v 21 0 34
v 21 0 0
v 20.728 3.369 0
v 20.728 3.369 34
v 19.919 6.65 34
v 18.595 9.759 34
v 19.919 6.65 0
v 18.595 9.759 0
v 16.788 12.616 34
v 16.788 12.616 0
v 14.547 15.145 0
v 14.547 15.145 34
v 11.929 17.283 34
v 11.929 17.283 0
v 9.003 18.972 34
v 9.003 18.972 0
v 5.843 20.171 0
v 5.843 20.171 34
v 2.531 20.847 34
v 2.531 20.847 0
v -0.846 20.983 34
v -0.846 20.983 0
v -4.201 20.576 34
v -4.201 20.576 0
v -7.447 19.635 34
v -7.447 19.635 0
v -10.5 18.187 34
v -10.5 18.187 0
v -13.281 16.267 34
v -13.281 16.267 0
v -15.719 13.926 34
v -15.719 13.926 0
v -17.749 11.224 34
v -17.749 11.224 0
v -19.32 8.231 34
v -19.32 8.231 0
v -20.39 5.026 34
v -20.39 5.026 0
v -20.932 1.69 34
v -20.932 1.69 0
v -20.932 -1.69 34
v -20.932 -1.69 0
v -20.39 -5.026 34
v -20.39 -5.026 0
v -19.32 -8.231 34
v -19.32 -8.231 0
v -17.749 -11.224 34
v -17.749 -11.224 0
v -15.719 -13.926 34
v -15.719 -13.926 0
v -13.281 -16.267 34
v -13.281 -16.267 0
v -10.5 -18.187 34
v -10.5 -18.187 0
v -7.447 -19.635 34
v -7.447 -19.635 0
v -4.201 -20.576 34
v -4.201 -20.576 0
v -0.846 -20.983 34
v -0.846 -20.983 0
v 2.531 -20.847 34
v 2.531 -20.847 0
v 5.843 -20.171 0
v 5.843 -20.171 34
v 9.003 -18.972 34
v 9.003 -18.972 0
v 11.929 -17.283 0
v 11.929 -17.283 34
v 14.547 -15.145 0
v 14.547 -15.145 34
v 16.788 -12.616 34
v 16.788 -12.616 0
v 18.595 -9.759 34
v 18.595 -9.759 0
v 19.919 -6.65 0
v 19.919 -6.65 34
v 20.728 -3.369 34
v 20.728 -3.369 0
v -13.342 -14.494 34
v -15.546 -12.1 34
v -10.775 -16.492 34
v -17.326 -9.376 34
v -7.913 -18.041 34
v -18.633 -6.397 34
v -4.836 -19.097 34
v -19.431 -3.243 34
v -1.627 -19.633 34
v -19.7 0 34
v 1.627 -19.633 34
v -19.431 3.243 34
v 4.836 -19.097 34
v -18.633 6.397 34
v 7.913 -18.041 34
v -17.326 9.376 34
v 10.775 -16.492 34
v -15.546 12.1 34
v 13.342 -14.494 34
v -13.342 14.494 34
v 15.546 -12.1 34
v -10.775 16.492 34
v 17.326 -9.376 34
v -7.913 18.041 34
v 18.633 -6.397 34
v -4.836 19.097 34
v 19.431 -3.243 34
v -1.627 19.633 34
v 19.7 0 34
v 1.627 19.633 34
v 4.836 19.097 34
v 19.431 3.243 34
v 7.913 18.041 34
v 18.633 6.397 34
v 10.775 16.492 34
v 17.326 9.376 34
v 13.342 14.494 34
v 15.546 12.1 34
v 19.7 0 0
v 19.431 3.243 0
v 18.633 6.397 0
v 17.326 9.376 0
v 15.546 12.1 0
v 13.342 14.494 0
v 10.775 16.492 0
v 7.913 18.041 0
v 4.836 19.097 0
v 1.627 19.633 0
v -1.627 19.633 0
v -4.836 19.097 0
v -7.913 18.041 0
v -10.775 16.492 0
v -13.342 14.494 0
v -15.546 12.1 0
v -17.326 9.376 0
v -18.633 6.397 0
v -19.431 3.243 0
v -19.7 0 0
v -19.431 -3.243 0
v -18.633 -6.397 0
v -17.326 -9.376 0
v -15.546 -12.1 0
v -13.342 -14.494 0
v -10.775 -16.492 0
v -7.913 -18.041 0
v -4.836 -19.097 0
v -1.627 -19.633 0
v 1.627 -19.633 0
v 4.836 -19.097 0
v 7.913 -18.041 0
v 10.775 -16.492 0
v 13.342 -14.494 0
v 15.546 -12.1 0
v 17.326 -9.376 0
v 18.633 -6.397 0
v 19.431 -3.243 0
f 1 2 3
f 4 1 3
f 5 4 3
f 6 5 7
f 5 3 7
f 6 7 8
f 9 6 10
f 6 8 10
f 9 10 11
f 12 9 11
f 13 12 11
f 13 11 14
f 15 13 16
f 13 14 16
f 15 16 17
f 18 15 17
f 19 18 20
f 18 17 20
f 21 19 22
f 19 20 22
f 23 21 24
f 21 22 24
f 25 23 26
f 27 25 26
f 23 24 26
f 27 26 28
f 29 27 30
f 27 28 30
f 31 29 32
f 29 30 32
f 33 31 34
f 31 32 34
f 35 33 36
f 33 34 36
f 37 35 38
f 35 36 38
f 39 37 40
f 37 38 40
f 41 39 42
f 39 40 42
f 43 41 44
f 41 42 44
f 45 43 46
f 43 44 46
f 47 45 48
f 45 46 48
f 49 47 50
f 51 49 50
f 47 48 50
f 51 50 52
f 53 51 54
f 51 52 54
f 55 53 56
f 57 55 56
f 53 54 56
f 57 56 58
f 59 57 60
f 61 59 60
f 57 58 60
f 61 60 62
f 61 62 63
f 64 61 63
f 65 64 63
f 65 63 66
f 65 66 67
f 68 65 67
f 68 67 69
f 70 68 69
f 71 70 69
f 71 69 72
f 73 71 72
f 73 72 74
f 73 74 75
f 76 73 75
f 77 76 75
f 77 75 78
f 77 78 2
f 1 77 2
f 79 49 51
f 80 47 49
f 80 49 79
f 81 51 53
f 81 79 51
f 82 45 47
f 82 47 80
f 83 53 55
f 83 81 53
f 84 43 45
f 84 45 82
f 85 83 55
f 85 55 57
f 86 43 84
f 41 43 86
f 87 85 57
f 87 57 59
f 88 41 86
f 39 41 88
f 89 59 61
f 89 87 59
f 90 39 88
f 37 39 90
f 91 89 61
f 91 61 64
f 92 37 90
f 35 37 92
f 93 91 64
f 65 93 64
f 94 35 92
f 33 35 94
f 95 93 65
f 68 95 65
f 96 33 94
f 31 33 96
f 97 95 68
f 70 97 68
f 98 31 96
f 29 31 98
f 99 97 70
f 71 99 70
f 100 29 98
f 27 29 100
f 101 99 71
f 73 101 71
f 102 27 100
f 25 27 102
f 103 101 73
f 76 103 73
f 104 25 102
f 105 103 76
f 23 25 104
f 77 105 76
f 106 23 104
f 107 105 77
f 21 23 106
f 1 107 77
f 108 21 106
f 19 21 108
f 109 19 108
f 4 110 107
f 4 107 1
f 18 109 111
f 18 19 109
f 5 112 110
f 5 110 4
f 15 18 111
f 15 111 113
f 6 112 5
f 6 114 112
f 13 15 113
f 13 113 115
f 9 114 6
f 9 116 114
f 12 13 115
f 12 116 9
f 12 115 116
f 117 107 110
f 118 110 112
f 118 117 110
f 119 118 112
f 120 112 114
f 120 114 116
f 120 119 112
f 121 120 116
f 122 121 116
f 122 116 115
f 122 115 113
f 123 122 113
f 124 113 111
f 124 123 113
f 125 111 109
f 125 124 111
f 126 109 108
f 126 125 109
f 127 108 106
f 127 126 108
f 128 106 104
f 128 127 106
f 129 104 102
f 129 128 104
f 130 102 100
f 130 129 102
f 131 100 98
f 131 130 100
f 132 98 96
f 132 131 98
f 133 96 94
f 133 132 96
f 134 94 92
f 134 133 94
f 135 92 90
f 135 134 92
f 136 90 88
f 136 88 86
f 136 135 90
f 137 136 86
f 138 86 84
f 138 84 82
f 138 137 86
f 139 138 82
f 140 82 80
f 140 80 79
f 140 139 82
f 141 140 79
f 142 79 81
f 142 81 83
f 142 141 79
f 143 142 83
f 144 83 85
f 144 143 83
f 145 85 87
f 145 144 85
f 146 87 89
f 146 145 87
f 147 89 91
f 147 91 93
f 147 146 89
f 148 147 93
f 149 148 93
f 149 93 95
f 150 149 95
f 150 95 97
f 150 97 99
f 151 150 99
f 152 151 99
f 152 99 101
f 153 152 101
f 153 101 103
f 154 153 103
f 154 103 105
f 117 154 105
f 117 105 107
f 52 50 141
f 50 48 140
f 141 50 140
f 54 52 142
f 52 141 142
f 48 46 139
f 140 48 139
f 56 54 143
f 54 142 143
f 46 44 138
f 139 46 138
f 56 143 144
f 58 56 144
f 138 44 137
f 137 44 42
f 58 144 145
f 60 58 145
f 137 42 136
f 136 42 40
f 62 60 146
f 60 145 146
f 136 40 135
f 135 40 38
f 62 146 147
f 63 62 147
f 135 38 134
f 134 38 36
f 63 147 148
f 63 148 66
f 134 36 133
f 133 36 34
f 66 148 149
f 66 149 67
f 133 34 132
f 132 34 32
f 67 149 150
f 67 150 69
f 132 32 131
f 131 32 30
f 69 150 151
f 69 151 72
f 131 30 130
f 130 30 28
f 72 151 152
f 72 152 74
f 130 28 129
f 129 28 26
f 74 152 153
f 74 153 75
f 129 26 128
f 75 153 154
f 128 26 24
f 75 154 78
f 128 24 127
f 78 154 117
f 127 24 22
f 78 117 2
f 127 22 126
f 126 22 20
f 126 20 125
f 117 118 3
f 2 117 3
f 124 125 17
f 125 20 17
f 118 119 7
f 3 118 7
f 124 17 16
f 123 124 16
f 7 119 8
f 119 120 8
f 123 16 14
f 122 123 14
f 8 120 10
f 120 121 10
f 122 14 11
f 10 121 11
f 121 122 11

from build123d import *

# Parameters (mm, degrees)
CYLINDER001_R     = 19.7
CYLINDER001_DEPTH = 34
CYLINDER_R        = 21
CYLINDER_DEPTH    = 34


with BuildPart() as internal_cylinder:
    # Cylinder001 → Cylinder001 (new body)
    with BuildSketch(Plane.XY):
        Circle(CYLINDER001_R)
    extrude(amount=CYLINDER001_DEPTH)


with BuildPart() as umbrella_handle_protector:
    # Cylinder → Cylinder (new body)
    with BuildSketch(Plane.XY):
        Circle(CYLINDER_R)
    extrude(amount=CYLINDER_DEPTH)

    # Cut: cut internal cylinder
    add(internal_cylinder.part, mode=Mode.SUBTRACT)


solid = umbrella_handle_protector.part
